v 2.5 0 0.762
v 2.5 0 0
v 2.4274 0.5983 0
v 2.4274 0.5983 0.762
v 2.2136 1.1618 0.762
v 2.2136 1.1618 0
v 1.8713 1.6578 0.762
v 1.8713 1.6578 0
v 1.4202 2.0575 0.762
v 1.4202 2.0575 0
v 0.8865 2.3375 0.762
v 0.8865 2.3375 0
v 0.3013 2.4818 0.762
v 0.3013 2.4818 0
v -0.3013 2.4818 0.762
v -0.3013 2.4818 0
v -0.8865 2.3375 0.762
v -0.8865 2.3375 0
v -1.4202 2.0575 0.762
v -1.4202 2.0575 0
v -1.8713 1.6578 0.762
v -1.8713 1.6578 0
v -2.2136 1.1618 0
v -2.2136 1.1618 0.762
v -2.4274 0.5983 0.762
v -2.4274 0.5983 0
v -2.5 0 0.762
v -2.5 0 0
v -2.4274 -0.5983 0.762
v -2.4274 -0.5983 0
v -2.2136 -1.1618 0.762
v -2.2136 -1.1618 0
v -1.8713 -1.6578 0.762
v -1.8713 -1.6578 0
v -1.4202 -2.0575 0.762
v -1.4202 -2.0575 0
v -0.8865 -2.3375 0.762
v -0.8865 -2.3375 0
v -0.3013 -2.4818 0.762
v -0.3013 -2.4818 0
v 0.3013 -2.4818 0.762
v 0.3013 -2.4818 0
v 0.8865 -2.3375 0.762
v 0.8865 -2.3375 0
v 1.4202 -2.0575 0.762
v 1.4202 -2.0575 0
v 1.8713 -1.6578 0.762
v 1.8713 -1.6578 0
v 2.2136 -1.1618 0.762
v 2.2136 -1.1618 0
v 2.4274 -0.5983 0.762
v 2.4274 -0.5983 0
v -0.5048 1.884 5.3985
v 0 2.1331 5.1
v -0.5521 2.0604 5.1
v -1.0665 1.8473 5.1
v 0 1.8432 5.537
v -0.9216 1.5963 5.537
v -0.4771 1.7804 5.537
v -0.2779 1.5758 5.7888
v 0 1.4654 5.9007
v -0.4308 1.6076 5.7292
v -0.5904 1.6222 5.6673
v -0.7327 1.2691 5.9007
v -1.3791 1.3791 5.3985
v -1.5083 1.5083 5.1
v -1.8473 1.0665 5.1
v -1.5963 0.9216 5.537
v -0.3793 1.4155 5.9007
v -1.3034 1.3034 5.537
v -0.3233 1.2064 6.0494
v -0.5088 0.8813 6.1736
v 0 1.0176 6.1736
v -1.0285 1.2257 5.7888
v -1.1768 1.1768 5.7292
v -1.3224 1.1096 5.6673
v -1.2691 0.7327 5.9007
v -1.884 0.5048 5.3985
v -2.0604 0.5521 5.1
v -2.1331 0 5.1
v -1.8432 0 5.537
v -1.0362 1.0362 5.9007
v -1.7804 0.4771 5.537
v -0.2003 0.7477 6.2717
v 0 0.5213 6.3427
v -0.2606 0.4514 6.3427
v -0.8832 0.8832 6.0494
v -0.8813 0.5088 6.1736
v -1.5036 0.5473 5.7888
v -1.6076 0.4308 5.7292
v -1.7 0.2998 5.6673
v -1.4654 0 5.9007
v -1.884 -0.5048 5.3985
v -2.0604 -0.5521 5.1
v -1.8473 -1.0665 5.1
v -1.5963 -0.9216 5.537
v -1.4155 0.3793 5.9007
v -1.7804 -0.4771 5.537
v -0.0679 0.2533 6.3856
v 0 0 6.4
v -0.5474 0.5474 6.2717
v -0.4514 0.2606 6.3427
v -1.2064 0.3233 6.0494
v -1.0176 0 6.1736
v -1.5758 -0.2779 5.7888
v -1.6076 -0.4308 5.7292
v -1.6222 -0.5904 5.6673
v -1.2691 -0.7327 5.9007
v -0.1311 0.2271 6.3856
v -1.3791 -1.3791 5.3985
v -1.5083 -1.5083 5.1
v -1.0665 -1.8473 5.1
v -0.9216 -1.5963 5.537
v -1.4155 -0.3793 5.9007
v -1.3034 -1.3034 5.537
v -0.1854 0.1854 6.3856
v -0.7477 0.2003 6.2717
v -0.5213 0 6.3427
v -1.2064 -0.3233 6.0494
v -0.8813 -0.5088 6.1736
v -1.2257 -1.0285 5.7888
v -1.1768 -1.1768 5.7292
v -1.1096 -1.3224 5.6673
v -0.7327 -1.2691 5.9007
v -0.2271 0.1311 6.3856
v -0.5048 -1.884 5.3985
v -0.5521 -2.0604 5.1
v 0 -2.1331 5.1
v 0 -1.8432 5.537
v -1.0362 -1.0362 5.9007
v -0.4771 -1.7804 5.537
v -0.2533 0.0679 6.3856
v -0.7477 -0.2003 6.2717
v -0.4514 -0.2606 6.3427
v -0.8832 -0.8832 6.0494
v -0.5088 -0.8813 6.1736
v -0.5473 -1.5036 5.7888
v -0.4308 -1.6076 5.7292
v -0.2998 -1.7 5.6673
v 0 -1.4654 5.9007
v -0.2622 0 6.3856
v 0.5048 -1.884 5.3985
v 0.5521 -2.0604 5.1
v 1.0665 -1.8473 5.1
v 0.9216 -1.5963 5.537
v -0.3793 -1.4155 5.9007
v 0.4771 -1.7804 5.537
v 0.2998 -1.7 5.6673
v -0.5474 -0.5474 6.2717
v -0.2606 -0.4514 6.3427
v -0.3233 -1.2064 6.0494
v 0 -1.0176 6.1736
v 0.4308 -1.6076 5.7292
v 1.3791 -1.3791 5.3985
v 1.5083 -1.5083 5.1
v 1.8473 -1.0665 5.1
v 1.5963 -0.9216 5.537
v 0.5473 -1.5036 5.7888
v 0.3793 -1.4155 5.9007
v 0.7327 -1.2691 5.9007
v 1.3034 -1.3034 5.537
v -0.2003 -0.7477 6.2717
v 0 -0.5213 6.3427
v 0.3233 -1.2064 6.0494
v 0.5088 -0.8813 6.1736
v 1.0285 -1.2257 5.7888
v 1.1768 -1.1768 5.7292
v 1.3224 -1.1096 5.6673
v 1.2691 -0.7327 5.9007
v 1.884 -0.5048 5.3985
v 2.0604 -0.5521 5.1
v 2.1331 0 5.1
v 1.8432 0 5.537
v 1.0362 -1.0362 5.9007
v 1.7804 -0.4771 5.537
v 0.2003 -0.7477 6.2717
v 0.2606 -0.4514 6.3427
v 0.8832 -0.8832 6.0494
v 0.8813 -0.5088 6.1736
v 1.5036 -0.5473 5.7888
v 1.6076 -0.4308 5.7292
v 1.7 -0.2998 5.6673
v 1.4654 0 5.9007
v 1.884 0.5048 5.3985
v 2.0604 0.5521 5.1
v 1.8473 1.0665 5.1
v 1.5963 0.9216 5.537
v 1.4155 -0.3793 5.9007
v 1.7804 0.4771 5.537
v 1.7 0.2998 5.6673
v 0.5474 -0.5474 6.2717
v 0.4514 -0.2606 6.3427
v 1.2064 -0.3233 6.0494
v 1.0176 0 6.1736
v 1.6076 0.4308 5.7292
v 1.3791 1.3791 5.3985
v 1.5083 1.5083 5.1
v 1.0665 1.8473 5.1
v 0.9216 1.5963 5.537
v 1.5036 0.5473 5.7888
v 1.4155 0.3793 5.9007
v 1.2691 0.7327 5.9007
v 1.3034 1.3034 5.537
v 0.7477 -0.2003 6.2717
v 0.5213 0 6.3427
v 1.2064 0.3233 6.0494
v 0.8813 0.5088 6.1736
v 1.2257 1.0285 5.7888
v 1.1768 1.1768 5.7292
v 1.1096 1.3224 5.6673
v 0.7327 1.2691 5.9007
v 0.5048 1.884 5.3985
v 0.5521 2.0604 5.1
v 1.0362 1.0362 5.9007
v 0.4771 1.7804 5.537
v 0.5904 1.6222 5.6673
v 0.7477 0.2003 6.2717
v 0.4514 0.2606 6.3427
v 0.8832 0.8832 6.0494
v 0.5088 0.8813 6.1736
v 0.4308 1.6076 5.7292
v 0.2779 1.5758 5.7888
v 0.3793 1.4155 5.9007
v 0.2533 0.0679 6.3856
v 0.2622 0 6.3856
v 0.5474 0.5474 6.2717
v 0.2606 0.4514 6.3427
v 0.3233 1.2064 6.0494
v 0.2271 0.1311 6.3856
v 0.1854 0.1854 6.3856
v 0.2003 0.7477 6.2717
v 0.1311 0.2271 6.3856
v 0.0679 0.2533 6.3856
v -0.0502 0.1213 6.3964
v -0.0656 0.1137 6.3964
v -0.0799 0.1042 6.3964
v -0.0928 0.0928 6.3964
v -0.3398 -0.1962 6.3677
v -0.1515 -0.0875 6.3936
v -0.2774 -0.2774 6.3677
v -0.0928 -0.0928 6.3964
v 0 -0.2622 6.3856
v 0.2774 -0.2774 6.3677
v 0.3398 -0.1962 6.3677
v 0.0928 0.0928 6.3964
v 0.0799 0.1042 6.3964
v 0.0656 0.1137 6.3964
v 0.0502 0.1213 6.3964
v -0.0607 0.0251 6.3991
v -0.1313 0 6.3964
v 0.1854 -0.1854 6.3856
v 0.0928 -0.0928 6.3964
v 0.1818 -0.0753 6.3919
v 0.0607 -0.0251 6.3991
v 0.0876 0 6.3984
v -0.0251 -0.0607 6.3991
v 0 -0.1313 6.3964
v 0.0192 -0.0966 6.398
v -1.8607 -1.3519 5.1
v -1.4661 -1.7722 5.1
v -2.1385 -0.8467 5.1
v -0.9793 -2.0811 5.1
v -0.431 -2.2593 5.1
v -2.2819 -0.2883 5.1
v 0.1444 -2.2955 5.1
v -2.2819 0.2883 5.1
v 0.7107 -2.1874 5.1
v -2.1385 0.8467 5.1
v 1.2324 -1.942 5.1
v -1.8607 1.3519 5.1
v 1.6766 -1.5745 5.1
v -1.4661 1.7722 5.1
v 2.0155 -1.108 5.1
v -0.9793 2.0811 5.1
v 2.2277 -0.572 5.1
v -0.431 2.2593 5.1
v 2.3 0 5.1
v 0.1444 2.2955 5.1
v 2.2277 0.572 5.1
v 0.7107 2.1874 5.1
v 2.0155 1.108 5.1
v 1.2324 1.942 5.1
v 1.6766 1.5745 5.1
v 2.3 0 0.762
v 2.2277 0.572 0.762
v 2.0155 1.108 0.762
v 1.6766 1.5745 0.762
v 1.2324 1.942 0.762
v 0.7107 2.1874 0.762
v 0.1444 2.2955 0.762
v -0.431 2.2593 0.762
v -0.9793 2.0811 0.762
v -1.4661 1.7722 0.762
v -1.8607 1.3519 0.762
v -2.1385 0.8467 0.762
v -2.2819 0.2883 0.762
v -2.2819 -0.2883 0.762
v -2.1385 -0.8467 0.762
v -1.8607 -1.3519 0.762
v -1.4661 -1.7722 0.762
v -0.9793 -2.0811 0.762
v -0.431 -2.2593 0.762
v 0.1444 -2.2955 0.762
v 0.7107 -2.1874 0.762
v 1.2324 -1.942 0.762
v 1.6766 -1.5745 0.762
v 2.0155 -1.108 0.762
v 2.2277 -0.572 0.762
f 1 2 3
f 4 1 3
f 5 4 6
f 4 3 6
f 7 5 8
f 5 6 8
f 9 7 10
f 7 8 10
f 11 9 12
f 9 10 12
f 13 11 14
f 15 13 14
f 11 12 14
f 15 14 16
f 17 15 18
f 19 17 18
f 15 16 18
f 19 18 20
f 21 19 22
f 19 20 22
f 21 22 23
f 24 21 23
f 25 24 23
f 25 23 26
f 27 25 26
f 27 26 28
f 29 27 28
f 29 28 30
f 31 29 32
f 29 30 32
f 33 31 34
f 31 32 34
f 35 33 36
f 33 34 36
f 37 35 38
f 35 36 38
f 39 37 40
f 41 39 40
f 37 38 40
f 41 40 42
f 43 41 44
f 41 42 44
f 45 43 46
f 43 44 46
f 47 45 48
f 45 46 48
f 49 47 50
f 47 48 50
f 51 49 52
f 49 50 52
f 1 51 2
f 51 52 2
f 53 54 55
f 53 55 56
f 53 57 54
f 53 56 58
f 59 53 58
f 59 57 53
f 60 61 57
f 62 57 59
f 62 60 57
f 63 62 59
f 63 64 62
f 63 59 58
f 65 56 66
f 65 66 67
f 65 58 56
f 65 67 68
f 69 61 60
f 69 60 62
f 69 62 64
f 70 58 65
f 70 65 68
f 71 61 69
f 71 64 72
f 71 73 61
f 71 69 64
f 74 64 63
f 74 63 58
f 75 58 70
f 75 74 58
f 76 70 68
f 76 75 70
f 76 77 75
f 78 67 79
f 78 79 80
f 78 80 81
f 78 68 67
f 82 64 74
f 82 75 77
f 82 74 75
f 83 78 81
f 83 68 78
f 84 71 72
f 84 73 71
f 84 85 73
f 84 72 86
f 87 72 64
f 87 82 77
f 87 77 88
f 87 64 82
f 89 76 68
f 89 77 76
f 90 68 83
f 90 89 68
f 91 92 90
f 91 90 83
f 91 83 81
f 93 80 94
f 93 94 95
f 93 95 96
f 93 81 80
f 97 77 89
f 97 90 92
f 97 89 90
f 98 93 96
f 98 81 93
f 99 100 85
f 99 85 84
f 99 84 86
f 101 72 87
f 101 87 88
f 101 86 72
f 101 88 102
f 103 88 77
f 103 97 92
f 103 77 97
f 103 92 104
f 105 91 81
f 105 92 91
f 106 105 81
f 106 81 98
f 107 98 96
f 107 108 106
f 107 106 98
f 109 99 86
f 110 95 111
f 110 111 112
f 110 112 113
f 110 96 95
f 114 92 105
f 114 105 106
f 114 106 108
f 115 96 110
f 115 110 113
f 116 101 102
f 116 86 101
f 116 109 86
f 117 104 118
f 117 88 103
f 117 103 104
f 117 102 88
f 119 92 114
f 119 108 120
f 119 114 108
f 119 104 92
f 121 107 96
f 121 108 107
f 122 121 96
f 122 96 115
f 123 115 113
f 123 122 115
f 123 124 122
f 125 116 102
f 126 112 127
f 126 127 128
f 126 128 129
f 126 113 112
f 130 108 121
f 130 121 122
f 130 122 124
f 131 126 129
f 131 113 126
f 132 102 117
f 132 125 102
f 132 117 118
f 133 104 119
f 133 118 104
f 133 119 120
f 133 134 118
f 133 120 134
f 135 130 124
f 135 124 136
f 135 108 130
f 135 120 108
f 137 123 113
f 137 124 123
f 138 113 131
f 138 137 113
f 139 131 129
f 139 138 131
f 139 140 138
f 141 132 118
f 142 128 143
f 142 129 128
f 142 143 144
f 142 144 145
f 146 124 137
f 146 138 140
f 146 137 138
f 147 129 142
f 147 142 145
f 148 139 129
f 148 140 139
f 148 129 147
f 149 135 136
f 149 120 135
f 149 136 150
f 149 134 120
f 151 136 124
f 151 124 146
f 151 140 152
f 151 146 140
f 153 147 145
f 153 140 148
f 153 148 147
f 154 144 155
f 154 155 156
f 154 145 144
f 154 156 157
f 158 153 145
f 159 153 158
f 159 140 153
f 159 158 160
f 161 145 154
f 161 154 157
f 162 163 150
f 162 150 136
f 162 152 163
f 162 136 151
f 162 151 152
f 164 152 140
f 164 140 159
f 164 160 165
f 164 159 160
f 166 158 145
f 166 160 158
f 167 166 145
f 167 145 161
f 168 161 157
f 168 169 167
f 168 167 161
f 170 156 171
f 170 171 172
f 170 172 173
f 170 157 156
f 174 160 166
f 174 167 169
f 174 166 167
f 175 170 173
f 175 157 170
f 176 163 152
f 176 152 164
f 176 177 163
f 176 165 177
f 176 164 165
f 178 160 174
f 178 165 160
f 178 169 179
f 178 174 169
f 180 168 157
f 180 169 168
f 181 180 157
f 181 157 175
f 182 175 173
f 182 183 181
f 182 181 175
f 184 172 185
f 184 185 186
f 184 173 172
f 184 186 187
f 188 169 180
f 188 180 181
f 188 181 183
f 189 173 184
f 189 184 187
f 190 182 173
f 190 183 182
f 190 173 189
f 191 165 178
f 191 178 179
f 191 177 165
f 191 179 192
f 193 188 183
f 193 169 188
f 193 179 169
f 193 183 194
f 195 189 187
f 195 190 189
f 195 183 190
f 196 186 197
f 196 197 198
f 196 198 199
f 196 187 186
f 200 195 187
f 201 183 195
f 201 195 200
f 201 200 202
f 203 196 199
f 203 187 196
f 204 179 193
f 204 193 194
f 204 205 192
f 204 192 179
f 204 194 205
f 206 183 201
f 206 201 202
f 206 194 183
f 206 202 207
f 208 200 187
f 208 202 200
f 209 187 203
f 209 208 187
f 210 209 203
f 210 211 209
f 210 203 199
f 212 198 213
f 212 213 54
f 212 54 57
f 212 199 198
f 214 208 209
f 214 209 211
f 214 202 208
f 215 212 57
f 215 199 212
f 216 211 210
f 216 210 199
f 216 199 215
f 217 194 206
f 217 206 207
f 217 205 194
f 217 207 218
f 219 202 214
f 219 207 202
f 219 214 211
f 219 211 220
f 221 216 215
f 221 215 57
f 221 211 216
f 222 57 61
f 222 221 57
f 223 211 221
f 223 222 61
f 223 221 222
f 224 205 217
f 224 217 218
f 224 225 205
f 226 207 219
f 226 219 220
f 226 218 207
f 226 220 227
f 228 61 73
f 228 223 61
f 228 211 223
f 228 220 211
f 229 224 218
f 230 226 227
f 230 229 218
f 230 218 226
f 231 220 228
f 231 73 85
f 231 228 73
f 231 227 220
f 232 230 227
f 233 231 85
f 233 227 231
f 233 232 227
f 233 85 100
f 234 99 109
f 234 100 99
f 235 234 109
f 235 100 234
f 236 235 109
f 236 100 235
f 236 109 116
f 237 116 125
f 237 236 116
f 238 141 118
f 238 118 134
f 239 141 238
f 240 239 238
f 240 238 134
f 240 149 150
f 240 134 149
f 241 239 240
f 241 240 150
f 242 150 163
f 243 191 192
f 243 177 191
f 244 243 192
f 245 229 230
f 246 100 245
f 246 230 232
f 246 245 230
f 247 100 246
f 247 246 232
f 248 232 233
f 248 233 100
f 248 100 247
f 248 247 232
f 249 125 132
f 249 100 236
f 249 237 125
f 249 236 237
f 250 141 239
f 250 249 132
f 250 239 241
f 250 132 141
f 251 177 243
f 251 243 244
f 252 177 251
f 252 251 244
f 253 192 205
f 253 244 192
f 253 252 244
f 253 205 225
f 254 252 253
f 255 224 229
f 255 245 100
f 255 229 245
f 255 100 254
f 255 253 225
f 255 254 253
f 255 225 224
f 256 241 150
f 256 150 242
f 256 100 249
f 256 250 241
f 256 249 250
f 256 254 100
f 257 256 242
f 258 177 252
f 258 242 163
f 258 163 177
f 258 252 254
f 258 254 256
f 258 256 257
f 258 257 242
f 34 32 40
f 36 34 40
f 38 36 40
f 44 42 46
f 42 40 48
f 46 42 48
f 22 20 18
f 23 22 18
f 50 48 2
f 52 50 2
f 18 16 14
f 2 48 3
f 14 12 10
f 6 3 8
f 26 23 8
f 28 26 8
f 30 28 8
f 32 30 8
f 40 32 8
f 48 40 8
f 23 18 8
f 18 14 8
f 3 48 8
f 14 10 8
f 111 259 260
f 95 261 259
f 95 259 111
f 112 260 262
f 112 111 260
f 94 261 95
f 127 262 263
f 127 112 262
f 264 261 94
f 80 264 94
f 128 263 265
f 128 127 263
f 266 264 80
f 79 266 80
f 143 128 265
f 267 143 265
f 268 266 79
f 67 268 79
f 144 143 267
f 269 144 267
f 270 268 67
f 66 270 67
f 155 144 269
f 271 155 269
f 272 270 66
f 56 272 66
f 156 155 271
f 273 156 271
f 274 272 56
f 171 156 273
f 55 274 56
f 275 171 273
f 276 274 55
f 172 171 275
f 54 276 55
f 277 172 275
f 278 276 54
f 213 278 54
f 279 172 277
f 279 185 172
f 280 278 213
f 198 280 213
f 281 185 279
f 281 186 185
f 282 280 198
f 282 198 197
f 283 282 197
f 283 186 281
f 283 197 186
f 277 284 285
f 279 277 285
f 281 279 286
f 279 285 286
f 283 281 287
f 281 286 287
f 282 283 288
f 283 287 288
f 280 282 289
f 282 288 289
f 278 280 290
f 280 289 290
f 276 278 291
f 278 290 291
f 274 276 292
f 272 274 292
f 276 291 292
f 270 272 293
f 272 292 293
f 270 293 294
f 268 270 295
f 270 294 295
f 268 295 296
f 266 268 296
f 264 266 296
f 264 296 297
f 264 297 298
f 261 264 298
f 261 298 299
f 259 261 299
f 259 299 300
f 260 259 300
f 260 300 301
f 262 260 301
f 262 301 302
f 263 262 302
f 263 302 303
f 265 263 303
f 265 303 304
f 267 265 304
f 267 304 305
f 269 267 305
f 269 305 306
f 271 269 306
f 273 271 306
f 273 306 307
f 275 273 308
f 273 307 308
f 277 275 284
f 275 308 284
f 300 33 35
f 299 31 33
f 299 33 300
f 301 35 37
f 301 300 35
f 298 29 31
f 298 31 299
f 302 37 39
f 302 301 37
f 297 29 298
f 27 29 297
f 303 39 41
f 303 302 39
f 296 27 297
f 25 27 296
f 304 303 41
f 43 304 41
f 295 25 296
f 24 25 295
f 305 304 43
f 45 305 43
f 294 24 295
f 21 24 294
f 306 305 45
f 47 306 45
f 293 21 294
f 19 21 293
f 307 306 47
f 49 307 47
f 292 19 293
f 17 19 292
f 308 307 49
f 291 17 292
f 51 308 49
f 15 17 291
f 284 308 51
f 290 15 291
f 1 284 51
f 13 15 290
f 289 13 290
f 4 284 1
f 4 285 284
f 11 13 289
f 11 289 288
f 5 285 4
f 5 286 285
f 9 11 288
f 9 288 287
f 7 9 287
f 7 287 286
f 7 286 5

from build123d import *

# Parameters (mm, degrees)
SKETCH_R     = 2.5
PAD_DEPTH    = 0.762
SKETCH002_R  = 2.3
PAD001_DEPTH = 5.1


with BuildPart() as part:
    # Sketch → Pad (new body)
    with BuildSketch(Plane.XY):
        Circle(SKETCH_R)
    extrude(amount=PAD_DEPTH)

    # Sketch002 → Pad001 (join)
    with BuildSketch(Plane.XY):
        Circle(SKETCH002_R)
    extrude(amount=PAD001_DEPTH)

    # Sketch003 → Revolution (revolve)
    with BuildSketch(Plane.YZ):
        with BuildLine():
            Line((0, 5.1), (0, 6.4))
            ThreePointArc((2.133073, 5.1), (1.249, 6.04939), (0, 6.4))
            Line((0, 5.1), (2.133073, 5.1))
        make_face()
    revolve(axis=Axis((0, 0, 0), (0, 0, 1)))


solid = part.part
